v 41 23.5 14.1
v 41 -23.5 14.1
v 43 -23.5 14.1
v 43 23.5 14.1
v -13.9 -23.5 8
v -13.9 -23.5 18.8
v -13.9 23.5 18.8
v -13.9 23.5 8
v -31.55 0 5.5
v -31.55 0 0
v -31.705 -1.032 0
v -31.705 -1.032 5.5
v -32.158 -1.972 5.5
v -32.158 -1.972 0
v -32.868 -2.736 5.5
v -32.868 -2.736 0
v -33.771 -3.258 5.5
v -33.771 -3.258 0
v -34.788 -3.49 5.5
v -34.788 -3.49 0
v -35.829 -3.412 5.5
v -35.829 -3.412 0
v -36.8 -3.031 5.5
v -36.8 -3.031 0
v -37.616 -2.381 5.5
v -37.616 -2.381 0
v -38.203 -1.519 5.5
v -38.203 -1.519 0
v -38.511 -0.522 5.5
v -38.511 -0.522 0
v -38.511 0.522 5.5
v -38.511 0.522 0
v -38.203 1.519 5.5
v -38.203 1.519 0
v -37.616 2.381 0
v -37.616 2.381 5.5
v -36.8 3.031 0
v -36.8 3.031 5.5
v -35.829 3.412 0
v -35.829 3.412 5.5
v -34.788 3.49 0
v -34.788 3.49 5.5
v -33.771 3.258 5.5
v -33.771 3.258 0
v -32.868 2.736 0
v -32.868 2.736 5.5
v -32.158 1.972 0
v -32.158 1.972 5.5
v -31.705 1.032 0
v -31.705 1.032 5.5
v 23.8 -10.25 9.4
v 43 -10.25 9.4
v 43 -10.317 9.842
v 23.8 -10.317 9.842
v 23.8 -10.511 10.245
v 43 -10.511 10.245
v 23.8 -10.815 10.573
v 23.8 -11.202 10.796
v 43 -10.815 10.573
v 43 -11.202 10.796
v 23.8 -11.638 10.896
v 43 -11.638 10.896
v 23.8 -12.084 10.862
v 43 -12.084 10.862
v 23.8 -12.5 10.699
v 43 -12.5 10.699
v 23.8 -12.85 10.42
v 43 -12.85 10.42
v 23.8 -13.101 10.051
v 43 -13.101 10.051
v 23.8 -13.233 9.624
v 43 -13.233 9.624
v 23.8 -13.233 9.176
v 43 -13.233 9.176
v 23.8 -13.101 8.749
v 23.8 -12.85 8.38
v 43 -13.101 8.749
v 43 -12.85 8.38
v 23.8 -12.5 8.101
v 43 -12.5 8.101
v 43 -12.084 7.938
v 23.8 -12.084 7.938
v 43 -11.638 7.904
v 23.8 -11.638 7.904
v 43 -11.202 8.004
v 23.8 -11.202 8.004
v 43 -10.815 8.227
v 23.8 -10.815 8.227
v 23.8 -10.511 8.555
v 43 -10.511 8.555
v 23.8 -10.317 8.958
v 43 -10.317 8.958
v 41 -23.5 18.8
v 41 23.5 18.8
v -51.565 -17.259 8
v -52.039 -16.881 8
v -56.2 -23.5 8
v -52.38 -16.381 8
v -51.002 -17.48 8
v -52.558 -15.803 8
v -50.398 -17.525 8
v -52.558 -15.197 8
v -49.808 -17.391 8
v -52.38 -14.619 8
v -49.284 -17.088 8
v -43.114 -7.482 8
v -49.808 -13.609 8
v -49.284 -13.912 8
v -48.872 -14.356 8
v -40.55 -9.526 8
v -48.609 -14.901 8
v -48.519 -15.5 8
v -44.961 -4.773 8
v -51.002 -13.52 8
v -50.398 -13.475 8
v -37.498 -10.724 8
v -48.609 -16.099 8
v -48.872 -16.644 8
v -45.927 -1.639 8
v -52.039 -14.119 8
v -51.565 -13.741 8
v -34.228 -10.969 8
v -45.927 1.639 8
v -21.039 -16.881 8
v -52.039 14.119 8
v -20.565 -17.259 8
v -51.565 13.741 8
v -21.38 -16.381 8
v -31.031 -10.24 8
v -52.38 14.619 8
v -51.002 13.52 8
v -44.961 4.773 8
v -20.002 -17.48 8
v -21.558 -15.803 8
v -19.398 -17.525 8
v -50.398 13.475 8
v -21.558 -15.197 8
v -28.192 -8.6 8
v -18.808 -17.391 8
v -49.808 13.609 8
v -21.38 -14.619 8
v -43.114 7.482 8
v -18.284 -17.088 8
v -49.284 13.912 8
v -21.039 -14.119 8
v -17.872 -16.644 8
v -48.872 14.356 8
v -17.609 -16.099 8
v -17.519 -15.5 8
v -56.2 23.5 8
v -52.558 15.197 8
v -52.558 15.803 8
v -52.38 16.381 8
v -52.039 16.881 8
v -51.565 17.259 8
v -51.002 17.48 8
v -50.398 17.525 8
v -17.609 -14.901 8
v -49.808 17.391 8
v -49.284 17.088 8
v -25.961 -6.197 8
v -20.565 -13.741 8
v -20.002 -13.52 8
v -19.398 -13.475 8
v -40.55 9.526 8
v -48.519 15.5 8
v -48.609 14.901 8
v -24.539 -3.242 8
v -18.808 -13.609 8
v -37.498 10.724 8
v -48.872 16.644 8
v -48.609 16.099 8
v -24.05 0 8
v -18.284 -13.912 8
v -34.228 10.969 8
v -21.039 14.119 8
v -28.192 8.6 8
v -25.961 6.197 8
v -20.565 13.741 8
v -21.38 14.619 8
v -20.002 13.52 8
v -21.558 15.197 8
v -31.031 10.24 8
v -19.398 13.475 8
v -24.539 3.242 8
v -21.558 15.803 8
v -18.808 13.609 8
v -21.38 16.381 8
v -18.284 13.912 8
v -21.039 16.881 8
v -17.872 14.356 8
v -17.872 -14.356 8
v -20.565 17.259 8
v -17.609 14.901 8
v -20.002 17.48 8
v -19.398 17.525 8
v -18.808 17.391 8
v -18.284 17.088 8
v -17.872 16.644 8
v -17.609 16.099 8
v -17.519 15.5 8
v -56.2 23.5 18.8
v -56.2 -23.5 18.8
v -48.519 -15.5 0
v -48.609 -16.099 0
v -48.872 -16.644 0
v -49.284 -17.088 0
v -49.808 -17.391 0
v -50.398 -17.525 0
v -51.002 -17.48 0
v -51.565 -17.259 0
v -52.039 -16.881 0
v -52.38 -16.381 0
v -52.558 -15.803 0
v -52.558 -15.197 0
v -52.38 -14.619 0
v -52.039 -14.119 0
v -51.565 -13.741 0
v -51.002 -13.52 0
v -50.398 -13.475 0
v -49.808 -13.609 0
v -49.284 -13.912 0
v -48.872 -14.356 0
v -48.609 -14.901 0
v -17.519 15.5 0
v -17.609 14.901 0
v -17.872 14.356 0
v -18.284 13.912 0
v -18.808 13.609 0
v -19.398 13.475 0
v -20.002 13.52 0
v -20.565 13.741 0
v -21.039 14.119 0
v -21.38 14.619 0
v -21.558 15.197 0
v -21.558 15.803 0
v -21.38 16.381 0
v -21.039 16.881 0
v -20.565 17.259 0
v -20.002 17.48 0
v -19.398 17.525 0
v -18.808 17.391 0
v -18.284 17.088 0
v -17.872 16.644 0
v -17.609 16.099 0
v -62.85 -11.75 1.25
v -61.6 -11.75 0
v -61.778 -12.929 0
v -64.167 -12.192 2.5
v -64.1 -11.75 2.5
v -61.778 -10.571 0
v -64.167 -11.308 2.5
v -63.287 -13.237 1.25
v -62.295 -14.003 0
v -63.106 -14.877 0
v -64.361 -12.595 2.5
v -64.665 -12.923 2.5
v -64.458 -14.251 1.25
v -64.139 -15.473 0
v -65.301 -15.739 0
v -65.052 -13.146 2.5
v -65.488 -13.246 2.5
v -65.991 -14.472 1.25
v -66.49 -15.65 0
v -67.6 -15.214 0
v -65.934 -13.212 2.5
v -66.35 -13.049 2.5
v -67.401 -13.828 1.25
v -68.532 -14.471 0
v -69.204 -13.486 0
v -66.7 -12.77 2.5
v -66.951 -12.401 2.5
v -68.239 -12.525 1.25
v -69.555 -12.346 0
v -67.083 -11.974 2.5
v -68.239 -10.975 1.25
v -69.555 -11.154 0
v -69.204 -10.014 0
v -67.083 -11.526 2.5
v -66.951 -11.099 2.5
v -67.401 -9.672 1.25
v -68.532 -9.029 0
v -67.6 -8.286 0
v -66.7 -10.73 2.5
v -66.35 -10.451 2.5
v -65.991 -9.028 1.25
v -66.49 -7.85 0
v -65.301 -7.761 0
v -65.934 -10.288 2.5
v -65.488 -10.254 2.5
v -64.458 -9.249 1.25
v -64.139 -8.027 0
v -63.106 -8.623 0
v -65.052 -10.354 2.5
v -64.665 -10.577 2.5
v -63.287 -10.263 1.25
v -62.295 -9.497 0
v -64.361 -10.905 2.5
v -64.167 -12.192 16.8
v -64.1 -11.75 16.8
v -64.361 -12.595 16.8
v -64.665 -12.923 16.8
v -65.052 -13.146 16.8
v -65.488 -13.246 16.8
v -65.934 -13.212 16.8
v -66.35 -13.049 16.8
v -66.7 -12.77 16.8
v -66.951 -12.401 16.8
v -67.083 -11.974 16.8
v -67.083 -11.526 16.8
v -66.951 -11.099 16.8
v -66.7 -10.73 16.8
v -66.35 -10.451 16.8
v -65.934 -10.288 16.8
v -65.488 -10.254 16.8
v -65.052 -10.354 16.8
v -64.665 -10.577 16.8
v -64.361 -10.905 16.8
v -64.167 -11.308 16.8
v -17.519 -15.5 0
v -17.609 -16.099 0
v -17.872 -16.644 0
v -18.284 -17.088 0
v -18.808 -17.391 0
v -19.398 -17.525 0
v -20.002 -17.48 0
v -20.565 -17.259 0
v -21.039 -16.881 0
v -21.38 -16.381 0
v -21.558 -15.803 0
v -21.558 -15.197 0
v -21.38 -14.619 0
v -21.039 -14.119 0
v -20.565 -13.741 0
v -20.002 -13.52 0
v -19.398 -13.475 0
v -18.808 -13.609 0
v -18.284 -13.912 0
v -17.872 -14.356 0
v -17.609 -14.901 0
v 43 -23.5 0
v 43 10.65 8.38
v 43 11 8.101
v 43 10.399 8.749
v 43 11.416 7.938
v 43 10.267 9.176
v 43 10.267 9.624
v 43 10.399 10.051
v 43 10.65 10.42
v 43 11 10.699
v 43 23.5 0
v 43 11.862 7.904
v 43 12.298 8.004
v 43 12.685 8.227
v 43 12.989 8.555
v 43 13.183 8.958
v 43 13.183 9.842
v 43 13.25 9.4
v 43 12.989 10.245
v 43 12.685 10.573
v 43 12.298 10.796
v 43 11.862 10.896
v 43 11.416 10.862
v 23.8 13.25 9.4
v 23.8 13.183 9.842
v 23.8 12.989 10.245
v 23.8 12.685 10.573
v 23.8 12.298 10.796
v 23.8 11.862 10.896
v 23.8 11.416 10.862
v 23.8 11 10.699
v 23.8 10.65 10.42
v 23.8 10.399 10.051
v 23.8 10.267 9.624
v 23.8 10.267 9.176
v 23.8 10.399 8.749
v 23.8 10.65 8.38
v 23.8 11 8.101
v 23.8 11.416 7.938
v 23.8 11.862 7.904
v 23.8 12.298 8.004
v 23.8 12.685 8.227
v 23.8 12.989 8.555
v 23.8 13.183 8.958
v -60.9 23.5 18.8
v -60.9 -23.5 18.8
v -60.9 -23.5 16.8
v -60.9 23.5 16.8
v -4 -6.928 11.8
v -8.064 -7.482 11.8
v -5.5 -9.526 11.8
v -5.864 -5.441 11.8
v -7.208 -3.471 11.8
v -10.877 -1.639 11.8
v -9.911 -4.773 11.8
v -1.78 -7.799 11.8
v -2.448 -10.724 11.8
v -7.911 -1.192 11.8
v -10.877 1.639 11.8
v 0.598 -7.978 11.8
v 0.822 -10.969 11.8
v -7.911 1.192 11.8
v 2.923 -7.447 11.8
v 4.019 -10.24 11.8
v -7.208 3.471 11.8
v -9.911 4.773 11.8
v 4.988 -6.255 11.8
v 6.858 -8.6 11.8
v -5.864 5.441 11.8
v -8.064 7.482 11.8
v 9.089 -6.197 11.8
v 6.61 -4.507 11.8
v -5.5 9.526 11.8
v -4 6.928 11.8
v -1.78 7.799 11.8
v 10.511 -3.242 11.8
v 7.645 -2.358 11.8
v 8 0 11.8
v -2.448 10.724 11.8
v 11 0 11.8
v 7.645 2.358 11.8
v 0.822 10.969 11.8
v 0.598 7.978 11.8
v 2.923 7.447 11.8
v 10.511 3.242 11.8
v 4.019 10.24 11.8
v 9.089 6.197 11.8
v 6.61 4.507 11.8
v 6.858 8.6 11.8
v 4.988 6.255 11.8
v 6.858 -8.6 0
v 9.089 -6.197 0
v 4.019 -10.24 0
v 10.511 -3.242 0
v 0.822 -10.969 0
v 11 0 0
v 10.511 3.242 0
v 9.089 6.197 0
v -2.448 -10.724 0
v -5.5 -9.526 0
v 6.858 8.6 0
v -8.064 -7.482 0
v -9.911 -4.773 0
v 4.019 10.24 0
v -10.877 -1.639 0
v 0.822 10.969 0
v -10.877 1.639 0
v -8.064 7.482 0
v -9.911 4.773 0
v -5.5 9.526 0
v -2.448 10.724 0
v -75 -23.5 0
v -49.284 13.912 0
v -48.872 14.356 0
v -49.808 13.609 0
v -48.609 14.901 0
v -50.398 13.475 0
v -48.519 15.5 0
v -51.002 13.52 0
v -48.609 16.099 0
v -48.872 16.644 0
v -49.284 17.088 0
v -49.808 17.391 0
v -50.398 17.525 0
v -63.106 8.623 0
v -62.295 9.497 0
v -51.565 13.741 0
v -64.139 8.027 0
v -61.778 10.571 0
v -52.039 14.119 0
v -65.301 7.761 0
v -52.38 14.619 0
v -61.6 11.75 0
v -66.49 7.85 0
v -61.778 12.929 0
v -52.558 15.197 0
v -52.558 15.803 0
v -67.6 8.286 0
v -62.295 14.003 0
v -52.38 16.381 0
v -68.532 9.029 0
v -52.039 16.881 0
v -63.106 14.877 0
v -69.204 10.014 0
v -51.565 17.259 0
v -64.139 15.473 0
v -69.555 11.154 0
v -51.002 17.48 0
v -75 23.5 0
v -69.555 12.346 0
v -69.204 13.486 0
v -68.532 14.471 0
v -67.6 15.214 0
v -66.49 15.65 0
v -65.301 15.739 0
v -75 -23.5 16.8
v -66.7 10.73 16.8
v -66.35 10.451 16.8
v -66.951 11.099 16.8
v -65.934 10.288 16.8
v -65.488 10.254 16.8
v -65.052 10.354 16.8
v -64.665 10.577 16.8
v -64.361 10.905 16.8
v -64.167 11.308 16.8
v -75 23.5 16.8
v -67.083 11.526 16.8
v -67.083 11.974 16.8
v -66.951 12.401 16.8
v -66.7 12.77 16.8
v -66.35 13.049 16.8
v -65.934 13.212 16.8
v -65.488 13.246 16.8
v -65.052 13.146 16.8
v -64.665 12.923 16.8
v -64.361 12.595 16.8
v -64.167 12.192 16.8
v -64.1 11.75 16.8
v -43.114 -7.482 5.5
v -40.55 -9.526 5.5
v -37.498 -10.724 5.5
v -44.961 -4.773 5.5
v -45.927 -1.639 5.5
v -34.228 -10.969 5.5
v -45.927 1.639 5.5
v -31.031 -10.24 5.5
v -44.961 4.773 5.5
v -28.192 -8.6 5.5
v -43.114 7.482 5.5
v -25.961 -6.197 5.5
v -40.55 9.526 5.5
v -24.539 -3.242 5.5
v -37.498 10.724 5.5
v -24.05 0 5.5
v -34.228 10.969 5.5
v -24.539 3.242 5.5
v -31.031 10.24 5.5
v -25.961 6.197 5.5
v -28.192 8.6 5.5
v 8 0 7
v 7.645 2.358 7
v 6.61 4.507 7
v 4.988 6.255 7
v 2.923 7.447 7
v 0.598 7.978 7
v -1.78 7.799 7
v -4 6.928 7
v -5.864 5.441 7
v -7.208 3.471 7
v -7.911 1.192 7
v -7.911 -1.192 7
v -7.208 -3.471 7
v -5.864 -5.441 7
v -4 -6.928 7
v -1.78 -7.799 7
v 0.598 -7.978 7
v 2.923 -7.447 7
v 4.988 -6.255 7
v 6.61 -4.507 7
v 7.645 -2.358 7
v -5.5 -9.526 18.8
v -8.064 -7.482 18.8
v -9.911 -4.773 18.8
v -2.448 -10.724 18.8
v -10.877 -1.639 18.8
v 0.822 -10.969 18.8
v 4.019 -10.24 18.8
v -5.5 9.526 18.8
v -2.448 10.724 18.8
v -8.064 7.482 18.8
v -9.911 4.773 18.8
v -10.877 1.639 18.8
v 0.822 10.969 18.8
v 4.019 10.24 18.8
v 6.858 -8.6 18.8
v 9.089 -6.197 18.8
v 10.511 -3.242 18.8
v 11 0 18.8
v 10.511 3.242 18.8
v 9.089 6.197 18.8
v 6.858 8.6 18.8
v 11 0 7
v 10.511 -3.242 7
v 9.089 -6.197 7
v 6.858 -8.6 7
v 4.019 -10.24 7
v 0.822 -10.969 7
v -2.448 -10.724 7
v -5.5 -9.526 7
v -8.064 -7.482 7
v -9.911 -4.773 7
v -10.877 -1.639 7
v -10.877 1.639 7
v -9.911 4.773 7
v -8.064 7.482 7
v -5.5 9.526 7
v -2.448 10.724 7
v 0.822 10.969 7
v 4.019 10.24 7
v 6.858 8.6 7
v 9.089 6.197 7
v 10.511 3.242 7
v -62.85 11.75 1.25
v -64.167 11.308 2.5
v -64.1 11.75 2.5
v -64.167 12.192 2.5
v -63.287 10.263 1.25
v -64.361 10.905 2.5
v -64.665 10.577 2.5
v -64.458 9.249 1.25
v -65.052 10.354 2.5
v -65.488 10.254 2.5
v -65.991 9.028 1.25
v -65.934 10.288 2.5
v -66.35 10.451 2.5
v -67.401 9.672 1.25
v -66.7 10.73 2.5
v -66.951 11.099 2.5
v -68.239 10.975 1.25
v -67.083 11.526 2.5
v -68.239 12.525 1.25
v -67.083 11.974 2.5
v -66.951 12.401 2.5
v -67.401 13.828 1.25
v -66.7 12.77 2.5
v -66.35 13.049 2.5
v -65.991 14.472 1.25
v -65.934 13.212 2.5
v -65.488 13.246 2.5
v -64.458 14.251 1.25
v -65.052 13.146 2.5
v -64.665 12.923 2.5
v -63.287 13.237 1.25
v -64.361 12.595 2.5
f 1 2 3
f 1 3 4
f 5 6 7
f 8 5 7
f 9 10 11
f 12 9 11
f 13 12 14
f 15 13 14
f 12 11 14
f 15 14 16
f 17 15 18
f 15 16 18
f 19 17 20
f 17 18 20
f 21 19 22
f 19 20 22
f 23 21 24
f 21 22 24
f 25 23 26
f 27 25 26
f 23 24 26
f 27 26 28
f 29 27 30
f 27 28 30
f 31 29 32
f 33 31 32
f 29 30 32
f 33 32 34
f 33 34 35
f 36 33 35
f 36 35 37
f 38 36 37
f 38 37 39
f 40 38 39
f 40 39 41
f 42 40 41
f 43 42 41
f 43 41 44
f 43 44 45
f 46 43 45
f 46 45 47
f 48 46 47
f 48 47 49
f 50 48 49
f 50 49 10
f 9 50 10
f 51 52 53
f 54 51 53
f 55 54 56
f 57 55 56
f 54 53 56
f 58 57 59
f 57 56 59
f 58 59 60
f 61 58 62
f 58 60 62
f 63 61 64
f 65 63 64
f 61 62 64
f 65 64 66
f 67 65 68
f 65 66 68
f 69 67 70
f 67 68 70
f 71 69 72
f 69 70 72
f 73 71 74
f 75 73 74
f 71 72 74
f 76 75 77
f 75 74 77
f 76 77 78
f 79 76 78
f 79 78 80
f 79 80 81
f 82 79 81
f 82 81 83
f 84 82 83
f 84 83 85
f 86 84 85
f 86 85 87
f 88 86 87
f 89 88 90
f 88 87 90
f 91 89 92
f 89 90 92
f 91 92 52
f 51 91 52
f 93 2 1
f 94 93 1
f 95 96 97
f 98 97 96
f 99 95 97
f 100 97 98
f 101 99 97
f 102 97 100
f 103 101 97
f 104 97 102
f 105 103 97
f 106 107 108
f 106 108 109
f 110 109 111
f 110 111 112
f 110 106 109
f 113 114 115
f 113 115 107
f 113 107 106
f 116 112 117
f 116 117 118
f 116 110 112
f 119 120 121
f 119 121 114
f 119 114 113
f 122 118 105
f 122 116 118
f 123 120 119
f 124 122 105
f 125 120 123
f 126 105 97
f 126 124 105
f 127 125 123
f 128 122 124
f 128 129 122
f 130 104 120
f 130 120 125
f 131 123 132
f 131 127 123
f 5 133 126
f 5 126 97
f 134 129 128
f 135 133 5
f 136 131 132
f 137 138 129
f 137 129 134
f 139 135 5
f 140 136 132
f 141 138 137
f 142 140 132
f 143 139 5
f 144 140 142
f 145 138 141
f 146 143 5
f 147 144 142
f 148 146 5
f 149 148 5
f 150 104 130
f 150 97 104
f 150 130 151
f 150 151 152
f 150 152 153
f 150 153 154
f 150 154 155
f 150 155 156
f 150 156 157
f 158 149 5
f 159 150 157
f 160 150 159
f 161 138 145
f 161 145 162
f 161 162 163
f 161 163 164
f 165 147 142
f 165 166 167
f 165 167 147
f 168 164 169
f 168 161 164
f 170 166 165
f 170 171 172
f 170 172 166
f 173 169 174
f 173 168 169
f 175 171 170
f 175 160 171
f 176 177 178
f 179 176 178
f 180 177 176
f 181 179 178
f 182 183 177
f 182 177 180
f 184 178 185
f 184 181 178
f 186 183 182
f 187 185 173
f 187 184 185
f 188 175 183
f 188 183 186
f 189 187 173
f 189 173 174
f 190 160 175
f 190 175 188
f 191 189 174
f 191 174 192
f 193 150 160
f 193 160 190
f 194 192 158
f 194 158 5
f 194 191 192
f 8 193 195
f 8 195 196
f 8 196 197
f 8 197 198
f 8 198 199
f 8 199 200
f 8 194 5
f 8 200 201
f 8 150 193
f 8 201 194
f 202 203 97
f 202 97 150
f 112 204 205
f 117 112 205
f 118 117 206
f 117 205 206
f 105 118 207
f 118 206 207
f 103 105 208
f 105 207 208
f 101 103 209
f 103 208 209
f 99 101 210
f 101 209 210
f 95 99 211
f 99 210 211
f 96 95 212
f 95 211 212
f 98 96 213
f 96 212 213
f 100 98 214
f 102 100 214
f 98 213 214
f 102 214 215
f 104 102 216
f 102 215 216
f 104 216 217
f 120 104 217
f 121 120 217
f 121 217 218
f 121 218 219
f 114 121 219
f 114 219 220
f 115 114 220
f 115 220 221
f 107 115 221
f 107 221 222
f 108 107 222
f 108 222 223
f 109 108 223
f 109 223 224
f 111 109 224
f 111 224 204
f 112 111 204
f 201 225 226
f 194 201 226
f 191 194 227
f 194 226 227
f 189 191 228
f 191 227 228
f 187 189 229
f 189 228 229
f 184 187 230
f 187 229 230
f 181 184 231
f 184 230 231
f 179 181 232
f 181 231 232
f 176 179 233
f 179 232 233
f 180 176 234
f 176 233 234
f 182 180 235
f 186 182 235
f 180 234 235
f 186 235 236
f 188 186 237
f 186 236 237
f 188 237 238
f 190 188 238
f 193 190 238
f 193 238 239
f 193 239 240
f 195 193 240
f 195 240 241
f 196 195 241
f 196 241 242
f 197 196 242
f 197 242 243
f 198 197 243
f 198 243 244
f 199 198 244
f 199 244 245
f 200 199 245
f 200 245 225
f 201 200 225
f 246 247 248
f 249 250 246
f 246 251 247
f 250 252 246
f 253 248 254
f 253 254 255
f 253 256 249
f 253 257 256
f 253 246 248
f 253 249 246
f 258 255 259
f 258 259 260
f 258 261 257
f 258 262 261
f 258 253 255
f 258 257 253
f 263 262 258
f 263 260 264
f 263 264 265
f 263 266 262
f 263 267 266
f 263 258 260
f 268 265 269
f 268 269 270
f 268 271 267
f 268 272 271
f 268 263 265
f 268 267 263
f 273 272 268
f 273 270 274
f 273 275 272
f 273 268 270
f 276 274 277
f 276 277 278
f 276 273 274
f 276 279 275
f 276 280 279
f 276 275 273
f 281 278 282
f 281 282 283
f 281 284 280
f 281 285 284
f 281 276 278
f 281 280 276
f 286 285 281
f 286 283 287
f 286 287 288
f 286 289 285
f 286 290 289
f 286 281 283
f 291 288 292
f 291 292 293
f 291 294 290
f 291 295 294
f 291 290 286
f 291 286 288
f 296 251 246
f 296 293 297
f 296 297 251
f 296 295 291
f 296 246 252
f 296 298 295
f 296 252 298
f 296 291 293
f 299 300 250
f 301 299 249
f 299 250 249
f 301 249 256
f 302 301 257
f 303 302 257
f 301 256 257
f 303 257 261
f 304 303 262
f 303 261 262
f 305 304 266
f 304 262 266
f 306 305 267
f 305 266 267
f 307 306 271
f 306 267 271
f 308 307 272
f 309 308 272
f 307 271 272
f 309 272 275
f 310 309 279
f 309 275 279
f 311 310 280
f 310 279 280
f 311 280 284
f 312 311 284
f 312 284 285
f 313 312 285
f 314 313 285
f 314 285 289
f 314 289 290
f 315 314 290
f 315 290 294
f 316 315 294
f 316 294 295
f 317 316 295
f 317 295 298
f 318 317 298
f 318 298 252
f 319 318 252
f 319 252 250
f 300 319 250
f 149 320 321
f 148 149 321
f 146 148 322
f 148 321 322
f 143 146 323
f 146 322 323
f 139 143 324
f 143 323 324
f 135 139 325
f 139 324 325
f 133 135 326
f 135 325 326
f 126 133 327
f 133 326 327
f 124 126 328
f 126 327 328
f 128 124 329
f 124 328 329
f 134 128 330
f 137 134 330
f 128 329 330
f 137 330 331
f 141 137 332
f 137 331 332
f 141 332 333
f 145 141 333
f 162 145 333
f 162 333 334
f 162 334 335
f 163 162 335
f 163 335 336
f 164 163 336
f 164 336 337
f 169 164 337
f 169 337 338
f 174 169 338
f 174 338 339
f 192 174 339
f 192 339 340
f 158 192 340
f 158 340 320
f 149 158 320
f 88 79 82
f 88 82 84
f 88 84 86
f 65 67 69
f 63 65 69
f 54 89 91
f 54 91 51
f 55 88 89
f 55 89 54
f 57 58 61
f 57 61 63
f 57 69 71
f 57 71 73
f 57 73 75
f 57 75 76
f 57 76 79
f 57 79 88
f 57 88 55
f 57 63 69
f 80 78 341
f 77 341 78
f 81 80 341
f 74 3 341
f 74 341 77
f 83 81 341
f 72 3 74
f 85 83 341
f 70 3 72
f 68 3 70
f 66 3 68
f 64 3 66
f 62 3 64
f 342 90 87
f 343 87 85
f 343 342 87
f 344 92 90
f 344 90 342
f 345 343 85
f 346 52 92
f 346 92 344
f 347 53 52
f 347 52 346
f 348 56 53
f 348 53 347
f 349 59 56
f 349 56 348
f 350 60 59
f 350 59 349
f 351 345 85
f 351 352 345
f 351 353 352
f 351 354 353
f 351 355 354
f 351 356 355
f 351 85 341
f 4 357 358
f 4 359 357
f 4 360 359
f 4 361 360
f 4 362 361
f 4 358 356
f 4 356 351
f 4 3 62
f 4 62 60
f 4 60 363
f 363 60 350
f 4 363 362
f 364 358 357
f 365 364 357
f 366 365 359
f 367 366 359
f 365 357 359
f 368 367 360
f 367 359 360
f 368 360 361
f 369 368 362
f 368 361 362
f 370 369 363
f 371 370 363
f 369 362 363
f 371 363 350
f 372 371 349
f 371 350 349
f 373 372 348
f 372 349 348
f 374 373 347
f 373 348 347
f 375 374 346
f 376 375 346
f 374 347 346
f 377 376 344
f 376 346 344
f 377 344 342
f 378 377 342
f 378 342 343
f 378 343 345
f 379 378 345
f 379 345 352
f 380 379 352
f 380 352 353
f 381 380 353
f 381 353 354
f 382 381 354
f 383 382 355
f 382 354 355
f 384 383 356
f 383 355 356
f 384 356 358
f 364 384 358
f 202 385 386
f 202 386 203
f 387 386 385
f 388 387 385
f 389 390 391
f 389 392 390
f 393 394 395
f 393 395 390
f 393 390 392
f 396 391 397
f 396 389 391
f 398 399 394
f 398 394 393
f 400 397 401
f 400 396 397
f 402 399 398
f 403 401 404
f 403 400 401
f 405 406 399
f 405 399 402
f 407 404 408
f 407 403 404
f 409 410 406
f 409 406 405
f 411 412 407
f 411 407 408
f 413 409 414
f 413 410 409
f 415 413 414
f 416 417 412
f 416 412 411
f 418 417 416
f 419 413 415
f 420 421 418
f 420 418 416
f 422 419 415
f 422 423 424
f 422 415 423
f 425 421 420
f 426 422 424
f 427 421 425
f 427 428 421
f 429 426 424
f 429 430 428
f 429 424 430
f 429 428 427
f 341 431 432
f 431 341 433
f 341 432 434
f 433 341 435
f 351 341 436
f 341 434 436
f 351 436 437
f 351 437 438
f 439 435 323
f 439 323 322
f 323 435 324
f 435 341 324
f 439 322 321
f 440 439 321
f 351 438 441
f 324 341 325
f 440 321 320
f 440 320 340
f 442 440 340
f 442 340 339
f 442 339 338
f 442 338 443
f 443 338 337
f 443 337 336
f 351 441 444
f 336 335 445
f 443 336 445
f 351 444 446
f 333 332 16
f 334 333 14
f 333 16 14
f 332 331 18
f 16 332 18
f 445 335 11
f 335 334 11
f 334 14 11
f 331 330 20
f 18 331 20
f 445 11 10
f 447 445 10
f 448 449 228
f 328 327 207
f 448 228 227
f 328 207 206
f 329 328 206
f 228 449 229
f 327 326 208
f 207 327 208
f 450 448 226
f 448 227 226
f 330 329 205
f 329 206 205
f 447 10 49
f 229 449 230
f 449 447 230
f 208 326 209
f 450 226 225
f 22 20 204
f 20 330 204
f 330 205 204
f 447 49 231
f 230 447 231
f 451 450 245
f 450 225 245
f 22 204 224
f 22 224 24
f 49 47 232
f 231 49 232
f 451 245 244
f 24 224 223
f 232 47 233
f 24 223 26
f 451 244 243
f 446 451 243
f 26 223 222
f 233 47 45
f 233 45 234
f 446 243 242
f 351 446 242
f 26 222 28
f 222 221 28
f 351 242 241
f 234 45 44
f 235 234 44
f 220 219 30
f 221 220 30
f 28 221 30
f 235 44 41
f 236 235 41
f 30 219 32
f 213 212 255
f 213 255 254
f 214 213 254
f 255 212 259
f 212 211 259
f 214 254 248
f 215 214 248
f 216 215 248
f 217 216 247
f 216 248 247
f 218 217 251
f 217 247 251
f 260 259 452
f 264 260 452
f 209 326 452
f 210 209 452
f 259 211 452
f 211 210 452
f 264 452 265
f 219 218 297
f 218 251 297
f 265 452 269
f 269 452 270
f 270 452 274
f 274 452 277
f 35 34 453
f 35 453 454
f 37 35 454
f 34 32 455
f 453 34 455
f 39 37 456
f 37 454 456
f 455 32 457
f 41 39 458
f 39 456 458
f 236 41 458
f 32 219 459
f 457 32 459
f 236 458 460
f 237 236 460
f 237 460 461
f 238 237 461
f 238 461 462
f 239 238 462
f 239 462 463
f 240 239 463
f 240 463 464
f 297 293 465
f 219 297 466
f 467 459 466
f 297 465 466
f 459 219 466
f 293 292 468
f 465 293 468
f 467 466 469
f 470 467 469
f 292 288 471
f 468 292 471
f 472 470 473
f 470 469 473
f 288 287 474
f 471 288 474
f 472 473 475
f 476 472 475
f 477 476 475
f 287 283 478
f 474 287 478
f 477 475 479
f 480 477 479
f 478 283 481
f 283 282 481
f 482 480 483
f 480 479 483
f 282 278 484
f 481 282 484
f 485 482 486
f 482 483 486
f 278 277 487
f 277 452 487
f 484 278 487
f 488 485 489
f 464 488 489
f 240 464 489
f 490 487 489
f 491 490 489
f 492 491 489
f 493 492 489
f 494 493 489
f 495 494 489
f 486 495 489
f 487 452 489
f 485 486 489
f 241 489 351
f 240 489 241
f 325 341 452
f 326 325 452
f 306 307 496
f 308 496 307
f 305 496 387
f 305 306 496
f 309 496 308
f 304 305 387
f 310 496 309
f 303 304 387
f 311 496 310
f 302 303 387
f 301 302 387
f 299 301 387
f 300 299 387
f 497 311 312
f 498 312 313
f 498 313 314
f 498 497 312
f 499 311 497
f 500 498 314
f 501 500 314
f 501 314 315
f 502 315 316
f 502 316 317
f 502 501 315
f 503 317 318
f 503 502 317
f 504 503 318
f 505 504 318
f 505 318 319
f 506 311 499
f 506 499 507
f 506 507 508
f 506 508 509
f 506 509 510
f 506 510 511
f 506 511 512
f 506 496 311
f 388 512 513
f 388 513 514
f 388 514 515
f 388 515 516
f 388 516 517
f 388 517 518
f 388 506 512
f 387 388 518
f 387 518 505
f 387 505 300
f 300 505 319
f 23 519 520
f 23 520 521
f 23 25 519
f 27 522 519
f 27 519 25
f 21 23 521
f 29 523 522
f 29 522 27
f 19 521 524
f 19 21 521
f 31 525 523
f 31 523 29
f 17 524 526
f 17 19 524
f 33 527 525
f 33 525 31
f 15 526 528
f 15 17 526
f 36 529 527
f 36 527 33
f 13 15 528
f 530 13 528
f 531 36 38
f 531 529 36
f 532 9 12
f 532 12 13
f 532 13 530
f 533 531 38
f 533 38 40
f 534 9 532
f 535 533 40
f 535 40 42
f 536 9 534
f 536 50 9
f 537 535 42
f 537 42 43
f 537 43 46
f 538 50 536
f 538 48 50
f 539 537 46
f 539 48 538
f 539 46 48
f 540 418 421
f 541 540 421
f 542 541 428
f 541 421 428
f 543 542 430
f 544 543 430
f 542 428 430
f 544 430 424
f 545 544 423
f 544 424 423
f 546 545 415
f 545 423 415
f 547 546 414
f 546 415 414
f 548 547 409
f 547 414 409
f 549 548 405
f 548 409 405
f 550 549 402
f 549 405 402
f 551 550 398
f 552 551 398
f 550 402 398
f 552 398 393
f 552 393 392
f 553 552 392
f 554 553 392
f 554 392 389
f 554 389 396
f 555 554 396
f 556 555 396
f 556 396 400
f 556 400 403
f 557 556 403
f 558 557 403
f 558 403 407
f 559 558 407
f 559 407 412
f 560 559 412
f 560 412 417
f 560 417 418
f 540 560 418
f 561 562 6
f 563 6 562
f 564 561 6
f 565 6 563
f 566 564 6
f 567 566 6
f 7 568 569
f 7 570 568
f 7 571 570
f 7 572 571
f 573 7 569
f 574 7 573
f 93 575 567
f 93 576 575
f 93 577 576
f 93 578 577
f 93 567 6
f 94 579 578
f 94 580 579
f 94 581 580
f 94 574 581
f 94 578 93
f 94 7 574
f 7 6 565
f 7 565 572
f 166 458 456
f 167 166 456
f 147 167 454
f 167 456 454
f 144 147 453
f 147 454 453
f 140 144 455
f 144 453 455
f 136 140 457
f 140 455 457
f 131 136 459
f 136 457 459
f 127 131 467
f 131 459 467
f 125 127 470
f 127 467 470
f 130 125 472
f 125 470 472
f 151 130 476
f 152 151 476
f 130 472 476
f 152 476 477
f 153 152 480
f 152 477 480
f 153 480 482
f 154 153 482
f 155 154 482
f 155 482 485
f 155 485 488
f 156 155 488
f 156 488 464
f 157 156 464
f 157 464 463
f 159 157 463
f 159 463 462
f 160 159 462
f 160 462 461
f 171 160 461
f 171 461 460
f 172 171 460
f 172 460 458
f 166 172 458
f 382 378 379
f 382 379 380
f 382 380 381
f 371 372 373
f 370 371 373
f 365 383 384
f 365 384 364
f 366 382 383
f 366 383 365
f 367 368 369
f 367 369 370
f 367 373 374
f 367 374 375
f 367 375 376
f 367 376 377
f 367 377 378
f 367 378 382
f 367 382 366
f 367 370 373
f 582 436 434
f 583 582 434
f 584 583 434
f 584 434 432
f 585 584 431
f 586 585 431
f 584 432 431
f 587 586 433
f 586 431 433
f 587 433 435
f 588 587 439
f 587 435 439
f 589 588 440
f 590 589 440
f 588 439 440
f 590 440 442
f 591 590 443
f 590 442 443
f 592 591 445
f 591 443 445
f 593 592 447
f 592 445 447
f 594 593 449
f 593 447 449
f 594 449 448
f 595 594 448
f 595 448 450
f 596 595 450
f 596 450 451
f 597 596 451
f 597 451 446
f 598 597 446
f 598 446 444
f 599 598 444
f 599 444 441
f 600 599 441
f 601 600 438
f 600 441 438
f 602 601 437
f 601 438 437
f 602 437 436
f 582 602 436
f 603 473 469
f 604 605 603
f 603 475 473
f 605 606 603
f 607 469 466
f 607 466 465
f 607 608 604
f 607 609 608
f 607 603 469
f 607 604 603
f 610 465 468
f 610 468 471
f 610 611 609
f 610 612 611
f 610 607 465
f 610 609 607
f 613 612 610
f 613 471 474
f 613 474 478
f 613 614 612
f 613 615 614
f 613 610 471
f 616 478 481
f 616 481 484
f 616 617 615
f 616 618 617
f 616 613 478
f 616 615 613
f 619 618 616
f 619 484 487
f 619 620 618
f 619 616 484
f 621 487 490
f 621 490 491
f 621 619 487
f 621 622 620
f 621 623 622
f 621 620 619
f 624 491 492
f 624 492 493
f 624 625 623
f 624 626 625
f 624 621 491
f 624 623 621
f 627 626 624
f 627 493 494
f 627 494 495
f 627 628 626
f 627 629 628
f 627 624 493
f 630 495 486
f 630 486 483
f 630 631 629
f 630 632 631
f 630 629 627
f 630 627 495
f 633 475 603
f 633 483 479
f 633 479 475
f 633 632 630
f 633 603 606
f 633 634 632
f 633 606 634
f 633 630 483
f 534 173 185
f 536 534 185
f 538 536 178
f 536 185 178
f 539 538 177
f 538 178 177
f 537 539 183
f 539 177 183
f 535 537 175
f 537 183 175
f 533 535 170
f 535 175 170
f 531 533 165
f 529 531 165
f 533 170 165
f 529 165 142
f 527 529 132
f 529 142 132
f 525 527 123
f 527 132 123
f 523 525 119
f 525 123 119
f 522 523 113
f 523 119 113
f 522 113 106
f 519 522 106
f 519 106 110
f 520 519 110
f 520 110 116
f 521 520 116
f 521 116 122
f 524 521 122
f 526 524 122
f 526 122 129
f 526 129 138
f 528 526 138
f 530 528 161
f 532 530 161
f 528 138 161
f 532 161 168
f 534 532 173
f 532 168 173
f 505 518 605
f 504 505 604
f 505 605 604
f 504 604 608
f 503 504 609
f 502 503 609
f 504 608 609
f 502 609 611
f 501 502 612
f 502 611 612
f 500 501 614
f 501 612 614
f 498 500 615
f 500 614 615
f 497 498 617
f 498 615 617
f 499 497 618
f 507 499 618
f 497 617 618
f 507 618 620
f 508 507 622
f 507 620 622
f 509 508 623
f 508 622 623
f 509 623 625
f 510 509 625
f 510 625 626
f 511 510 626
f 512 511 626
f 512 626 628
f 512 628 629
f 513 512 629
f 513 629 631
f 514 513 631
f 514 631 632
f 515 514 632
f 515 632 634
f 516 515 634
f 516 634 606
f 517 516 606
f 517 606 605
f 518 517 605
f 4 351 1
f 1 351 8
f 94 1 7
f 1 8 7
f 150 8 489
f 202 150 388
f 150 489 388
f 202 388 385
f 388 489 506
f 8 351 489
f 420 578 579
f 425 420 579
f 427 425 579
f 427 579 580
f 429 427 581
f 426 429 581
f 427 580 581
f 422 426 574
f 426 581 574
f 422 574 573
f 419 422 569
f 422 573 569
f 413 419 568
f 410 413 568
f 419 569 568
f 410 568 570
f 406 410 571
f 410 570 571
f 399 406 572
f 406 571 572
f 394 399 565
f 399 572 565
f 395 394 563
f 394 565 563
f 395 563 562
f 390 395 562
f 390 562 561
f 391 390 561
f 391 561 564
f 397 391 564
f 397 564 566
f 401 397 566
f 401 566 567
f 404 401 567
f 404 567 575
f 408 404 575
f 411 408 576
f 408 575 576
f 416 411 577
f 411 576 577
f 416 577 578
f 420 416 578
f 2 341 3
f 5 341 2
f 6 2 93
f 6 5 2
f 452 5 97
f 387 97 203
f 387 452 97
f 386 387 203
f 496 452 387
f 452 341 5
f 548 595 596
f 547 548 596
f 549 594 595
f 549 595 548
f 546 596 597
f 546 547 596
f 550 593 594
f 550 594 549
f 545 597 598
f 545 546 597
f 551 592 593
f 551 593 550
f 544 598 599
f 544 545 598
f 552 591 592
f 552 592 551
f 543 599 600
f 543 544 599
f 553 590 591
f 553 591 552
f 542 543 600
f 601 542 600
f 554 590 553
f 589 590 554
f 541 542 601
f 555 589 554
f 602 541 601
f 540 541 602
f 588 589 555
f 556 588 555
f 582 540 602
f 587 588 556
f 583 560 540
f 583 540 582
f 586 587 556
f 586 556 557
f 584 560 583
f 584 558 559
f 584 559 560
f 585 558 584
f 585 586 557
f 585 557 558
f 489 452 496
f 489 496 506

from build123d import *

# Parameters (mm, degrees)
SKETCH_W        = 116
SKETCH_H        = 47
PAD_DEPTH       = 18.8
SKETCH001_R     = 4
POCKET_DEPTH    = 18.8
SKETCH029_W     = 47
SKETCH029_H     = 14.1
PAD015_DEPTH    = 2
SKETCH031_R     = 2.030946
POCKET012_DEPTH = 18.8
SKETCH032_W     = 42.3
SKETCH032_H     = 47
POCKET013_DEPTH = 10.8
SKETCH033_R     = 11
POCKET014_DEPTH = 2.5
SKETCH034_R     = 3.5
POCKET015_DEPTH = 18.801
SKETCH035_W     = 14.1
SKETCH035_H     = 47
POCKET016_DEPTH = 2
SKETCH038_R     = 11
POCKET017_DEPTH = 7
SKETCH039_R     = 11
POCKET018_DEPTH = 7
SKETCH040_R     = 8
POCKET019_DEPTH = 11.801
SKETCH072_R     = 1.5
POCKET027_DEPTH = 18.801
CHAMFER002_SIZE = 2.5
SKETCH075_R     = 1.5
POCKET030_DEPTH = 19.2


with BuildPart() as part:
    # Sketch → Pad (new body)
    with BuildSketch(Plane.XY):
        with Locations((-17, 0)):
            Rectangle(SKETCH_W, SKETCH_H)
    extrude(amount=PAD_DEPTH)

    # Sketch001 (on Face6 of Pad) → Pocket (cut)
    with BuildSketch(Plane.XY.offset(18.8)):
        Circle(SKETCH001_R)
    extrude(amount=-POCKET_DEPTH, mode=Mode.SUBTRACT)

    # Sketch029 (on Face2 of Pad) → Pad015 (join)
    with BuildSketch(Plane.YZ.offset(41)):
        with Locations((0, 7.05)):
            Rectangle(SKETCH029_W, SKETCH029_H)
    extrude(amount=PAD015_DEPTH)

    # Sketch031 (on Face4 of Pad015) → Pocket012 (cut)
    with BuildSketch(Plane(origin=(0, 0, 0), x_dir=(1, 0, 0), z_dir=(0, 0, -1))):
        with Locations((-50.55, 15.5)):
            Circle(SKETCH031_R)
        with Locations((-19.55, 15.5)):
            Circle(SKETCH031_R)
        with Locations((-50.55, -15.5)):
            Circle(SKETCH031_R)
        with Locations((-19.55, -15.5)):
            Circle(SKETCH031_R)
    extrude(amount=-POCKET012_DEPTH, mode=Mode.SUBTRACT)

    # Sketch032 (on Face5 of Pocket012) → Pocket013 (cut)
    with BuildSketch(Plane.XY.offset(18.8)):
        with Locations((-35.05, 0)):
            Rectangle(SKETCH032_W, SKETCH032_H)
    extrude(amount=-POCKET013_DEPTH, mode=Mode.SUBTRACT)

    # Sketch033 (on Face7 of Pocket013) → Pocket014 (cut)
    with BuildSketch(Plane.XY.offset(8)):
        with Locations((-35.05, 0)):
            Circle(SKETCH033_R)
    extrude(amount=-POCKET014_DEPTH, mode=Mode.SUBTRACT)

    # Sketch034 (on Face4 of Pocket014) → Pocket015 (cut, through all)
    with BuildSketch(Plane(origin=(0, 0, 0), x_dir=(1, 0, 0), z_dir=(0, 0, -1))):
        with Locations((-35.05, 0)):
            Circle(SKETCH034_R)
    extrude(amount=-POCKET015_DEPTH, mode=Mode.SUBTRACT)

    # Sketch035 (on Face5 of Pocket015) → Pocket016 (cut)
    with BuildSketch(Plane.XY.offset(18.8)):
        with Locations((-67.95, 0)):
            Rectangle(SKETCH035_W, SKETCH035_H)
    extrude(amount=-POCKET016_DEPTH, mode=Mode.SUBTRACT)

    # Sketch038 (on Face15 of Pocket016) → Pocket017 (cut)
    with BuildSketch(Plane.XY.offset(18.8)):
        Circle(SKETCH038_R)
    extrude(amount=-POCKET017_DEPTH, mode=Mode.SUBTRACT)

    # Sketch039 (on Face2 of Pocket017) → Pocket018 (cut)
    with BuildSketch(Plane(origin=(0, 0, 0), x_dir=(1, 0, 0), z_dir=(0, 0, -1))):
        Circle(SKETCH039_R)
    extrude(amount=-POCKET018_DEPTH, mode=Mode.SUBTRACT)

    # Sketch040 (on Face29 of Pocket018) → Pocket019 (cut, through all)
    with BuildSketch(Plane.XY.offset(11.8)):
        Circle(SKETCH040_R)
    extrude(amount=-POCKET019_DEPTH, mode=Mode.SUBTRACT)

    # Sketch072 (on Face2 of Pocket019) → Pocket027 (cut, through all)
    with BuildSketch(Plane(origin=(0, 0, 0), x_dir=(1, 0, 0), z_dir=(0, 0, -1))):
        with Locations((-65.6, 11.75)):
            Circle(SKETCH072_R)
        with Locations((-65.6, -11.75)):
            Circle(SKETCH072_R)
    extrude(amount=-POCKET027_DEPTH, mode=Mode.SUBTRACT)

    # Chamfer002
    chamfer002_edges = [part.edges().sort_by_distance(p)[0] for p in [
        (-67.1, -11.75, 0),
        (-67.1, 11.75, 0),
    ]]
    chamfer(chamfer002_edges, length=CHAMFER002_SIZE)

    # Sketch075 (on Face24 of Chamfer002) → Pocket030 (cut)
    with BuildSketch(Plane.YZ.offset(43)):
        with Locations((-11.75, 9.4)):
            Circle(SKETCH075_R)
        with Locations((11.75, 9.4)):
            Circle(SKETCH075_R)
    extrude(amount=-POCKET030_DEPTH, mode=Mode.SUBTRACT)


solid = part.part
